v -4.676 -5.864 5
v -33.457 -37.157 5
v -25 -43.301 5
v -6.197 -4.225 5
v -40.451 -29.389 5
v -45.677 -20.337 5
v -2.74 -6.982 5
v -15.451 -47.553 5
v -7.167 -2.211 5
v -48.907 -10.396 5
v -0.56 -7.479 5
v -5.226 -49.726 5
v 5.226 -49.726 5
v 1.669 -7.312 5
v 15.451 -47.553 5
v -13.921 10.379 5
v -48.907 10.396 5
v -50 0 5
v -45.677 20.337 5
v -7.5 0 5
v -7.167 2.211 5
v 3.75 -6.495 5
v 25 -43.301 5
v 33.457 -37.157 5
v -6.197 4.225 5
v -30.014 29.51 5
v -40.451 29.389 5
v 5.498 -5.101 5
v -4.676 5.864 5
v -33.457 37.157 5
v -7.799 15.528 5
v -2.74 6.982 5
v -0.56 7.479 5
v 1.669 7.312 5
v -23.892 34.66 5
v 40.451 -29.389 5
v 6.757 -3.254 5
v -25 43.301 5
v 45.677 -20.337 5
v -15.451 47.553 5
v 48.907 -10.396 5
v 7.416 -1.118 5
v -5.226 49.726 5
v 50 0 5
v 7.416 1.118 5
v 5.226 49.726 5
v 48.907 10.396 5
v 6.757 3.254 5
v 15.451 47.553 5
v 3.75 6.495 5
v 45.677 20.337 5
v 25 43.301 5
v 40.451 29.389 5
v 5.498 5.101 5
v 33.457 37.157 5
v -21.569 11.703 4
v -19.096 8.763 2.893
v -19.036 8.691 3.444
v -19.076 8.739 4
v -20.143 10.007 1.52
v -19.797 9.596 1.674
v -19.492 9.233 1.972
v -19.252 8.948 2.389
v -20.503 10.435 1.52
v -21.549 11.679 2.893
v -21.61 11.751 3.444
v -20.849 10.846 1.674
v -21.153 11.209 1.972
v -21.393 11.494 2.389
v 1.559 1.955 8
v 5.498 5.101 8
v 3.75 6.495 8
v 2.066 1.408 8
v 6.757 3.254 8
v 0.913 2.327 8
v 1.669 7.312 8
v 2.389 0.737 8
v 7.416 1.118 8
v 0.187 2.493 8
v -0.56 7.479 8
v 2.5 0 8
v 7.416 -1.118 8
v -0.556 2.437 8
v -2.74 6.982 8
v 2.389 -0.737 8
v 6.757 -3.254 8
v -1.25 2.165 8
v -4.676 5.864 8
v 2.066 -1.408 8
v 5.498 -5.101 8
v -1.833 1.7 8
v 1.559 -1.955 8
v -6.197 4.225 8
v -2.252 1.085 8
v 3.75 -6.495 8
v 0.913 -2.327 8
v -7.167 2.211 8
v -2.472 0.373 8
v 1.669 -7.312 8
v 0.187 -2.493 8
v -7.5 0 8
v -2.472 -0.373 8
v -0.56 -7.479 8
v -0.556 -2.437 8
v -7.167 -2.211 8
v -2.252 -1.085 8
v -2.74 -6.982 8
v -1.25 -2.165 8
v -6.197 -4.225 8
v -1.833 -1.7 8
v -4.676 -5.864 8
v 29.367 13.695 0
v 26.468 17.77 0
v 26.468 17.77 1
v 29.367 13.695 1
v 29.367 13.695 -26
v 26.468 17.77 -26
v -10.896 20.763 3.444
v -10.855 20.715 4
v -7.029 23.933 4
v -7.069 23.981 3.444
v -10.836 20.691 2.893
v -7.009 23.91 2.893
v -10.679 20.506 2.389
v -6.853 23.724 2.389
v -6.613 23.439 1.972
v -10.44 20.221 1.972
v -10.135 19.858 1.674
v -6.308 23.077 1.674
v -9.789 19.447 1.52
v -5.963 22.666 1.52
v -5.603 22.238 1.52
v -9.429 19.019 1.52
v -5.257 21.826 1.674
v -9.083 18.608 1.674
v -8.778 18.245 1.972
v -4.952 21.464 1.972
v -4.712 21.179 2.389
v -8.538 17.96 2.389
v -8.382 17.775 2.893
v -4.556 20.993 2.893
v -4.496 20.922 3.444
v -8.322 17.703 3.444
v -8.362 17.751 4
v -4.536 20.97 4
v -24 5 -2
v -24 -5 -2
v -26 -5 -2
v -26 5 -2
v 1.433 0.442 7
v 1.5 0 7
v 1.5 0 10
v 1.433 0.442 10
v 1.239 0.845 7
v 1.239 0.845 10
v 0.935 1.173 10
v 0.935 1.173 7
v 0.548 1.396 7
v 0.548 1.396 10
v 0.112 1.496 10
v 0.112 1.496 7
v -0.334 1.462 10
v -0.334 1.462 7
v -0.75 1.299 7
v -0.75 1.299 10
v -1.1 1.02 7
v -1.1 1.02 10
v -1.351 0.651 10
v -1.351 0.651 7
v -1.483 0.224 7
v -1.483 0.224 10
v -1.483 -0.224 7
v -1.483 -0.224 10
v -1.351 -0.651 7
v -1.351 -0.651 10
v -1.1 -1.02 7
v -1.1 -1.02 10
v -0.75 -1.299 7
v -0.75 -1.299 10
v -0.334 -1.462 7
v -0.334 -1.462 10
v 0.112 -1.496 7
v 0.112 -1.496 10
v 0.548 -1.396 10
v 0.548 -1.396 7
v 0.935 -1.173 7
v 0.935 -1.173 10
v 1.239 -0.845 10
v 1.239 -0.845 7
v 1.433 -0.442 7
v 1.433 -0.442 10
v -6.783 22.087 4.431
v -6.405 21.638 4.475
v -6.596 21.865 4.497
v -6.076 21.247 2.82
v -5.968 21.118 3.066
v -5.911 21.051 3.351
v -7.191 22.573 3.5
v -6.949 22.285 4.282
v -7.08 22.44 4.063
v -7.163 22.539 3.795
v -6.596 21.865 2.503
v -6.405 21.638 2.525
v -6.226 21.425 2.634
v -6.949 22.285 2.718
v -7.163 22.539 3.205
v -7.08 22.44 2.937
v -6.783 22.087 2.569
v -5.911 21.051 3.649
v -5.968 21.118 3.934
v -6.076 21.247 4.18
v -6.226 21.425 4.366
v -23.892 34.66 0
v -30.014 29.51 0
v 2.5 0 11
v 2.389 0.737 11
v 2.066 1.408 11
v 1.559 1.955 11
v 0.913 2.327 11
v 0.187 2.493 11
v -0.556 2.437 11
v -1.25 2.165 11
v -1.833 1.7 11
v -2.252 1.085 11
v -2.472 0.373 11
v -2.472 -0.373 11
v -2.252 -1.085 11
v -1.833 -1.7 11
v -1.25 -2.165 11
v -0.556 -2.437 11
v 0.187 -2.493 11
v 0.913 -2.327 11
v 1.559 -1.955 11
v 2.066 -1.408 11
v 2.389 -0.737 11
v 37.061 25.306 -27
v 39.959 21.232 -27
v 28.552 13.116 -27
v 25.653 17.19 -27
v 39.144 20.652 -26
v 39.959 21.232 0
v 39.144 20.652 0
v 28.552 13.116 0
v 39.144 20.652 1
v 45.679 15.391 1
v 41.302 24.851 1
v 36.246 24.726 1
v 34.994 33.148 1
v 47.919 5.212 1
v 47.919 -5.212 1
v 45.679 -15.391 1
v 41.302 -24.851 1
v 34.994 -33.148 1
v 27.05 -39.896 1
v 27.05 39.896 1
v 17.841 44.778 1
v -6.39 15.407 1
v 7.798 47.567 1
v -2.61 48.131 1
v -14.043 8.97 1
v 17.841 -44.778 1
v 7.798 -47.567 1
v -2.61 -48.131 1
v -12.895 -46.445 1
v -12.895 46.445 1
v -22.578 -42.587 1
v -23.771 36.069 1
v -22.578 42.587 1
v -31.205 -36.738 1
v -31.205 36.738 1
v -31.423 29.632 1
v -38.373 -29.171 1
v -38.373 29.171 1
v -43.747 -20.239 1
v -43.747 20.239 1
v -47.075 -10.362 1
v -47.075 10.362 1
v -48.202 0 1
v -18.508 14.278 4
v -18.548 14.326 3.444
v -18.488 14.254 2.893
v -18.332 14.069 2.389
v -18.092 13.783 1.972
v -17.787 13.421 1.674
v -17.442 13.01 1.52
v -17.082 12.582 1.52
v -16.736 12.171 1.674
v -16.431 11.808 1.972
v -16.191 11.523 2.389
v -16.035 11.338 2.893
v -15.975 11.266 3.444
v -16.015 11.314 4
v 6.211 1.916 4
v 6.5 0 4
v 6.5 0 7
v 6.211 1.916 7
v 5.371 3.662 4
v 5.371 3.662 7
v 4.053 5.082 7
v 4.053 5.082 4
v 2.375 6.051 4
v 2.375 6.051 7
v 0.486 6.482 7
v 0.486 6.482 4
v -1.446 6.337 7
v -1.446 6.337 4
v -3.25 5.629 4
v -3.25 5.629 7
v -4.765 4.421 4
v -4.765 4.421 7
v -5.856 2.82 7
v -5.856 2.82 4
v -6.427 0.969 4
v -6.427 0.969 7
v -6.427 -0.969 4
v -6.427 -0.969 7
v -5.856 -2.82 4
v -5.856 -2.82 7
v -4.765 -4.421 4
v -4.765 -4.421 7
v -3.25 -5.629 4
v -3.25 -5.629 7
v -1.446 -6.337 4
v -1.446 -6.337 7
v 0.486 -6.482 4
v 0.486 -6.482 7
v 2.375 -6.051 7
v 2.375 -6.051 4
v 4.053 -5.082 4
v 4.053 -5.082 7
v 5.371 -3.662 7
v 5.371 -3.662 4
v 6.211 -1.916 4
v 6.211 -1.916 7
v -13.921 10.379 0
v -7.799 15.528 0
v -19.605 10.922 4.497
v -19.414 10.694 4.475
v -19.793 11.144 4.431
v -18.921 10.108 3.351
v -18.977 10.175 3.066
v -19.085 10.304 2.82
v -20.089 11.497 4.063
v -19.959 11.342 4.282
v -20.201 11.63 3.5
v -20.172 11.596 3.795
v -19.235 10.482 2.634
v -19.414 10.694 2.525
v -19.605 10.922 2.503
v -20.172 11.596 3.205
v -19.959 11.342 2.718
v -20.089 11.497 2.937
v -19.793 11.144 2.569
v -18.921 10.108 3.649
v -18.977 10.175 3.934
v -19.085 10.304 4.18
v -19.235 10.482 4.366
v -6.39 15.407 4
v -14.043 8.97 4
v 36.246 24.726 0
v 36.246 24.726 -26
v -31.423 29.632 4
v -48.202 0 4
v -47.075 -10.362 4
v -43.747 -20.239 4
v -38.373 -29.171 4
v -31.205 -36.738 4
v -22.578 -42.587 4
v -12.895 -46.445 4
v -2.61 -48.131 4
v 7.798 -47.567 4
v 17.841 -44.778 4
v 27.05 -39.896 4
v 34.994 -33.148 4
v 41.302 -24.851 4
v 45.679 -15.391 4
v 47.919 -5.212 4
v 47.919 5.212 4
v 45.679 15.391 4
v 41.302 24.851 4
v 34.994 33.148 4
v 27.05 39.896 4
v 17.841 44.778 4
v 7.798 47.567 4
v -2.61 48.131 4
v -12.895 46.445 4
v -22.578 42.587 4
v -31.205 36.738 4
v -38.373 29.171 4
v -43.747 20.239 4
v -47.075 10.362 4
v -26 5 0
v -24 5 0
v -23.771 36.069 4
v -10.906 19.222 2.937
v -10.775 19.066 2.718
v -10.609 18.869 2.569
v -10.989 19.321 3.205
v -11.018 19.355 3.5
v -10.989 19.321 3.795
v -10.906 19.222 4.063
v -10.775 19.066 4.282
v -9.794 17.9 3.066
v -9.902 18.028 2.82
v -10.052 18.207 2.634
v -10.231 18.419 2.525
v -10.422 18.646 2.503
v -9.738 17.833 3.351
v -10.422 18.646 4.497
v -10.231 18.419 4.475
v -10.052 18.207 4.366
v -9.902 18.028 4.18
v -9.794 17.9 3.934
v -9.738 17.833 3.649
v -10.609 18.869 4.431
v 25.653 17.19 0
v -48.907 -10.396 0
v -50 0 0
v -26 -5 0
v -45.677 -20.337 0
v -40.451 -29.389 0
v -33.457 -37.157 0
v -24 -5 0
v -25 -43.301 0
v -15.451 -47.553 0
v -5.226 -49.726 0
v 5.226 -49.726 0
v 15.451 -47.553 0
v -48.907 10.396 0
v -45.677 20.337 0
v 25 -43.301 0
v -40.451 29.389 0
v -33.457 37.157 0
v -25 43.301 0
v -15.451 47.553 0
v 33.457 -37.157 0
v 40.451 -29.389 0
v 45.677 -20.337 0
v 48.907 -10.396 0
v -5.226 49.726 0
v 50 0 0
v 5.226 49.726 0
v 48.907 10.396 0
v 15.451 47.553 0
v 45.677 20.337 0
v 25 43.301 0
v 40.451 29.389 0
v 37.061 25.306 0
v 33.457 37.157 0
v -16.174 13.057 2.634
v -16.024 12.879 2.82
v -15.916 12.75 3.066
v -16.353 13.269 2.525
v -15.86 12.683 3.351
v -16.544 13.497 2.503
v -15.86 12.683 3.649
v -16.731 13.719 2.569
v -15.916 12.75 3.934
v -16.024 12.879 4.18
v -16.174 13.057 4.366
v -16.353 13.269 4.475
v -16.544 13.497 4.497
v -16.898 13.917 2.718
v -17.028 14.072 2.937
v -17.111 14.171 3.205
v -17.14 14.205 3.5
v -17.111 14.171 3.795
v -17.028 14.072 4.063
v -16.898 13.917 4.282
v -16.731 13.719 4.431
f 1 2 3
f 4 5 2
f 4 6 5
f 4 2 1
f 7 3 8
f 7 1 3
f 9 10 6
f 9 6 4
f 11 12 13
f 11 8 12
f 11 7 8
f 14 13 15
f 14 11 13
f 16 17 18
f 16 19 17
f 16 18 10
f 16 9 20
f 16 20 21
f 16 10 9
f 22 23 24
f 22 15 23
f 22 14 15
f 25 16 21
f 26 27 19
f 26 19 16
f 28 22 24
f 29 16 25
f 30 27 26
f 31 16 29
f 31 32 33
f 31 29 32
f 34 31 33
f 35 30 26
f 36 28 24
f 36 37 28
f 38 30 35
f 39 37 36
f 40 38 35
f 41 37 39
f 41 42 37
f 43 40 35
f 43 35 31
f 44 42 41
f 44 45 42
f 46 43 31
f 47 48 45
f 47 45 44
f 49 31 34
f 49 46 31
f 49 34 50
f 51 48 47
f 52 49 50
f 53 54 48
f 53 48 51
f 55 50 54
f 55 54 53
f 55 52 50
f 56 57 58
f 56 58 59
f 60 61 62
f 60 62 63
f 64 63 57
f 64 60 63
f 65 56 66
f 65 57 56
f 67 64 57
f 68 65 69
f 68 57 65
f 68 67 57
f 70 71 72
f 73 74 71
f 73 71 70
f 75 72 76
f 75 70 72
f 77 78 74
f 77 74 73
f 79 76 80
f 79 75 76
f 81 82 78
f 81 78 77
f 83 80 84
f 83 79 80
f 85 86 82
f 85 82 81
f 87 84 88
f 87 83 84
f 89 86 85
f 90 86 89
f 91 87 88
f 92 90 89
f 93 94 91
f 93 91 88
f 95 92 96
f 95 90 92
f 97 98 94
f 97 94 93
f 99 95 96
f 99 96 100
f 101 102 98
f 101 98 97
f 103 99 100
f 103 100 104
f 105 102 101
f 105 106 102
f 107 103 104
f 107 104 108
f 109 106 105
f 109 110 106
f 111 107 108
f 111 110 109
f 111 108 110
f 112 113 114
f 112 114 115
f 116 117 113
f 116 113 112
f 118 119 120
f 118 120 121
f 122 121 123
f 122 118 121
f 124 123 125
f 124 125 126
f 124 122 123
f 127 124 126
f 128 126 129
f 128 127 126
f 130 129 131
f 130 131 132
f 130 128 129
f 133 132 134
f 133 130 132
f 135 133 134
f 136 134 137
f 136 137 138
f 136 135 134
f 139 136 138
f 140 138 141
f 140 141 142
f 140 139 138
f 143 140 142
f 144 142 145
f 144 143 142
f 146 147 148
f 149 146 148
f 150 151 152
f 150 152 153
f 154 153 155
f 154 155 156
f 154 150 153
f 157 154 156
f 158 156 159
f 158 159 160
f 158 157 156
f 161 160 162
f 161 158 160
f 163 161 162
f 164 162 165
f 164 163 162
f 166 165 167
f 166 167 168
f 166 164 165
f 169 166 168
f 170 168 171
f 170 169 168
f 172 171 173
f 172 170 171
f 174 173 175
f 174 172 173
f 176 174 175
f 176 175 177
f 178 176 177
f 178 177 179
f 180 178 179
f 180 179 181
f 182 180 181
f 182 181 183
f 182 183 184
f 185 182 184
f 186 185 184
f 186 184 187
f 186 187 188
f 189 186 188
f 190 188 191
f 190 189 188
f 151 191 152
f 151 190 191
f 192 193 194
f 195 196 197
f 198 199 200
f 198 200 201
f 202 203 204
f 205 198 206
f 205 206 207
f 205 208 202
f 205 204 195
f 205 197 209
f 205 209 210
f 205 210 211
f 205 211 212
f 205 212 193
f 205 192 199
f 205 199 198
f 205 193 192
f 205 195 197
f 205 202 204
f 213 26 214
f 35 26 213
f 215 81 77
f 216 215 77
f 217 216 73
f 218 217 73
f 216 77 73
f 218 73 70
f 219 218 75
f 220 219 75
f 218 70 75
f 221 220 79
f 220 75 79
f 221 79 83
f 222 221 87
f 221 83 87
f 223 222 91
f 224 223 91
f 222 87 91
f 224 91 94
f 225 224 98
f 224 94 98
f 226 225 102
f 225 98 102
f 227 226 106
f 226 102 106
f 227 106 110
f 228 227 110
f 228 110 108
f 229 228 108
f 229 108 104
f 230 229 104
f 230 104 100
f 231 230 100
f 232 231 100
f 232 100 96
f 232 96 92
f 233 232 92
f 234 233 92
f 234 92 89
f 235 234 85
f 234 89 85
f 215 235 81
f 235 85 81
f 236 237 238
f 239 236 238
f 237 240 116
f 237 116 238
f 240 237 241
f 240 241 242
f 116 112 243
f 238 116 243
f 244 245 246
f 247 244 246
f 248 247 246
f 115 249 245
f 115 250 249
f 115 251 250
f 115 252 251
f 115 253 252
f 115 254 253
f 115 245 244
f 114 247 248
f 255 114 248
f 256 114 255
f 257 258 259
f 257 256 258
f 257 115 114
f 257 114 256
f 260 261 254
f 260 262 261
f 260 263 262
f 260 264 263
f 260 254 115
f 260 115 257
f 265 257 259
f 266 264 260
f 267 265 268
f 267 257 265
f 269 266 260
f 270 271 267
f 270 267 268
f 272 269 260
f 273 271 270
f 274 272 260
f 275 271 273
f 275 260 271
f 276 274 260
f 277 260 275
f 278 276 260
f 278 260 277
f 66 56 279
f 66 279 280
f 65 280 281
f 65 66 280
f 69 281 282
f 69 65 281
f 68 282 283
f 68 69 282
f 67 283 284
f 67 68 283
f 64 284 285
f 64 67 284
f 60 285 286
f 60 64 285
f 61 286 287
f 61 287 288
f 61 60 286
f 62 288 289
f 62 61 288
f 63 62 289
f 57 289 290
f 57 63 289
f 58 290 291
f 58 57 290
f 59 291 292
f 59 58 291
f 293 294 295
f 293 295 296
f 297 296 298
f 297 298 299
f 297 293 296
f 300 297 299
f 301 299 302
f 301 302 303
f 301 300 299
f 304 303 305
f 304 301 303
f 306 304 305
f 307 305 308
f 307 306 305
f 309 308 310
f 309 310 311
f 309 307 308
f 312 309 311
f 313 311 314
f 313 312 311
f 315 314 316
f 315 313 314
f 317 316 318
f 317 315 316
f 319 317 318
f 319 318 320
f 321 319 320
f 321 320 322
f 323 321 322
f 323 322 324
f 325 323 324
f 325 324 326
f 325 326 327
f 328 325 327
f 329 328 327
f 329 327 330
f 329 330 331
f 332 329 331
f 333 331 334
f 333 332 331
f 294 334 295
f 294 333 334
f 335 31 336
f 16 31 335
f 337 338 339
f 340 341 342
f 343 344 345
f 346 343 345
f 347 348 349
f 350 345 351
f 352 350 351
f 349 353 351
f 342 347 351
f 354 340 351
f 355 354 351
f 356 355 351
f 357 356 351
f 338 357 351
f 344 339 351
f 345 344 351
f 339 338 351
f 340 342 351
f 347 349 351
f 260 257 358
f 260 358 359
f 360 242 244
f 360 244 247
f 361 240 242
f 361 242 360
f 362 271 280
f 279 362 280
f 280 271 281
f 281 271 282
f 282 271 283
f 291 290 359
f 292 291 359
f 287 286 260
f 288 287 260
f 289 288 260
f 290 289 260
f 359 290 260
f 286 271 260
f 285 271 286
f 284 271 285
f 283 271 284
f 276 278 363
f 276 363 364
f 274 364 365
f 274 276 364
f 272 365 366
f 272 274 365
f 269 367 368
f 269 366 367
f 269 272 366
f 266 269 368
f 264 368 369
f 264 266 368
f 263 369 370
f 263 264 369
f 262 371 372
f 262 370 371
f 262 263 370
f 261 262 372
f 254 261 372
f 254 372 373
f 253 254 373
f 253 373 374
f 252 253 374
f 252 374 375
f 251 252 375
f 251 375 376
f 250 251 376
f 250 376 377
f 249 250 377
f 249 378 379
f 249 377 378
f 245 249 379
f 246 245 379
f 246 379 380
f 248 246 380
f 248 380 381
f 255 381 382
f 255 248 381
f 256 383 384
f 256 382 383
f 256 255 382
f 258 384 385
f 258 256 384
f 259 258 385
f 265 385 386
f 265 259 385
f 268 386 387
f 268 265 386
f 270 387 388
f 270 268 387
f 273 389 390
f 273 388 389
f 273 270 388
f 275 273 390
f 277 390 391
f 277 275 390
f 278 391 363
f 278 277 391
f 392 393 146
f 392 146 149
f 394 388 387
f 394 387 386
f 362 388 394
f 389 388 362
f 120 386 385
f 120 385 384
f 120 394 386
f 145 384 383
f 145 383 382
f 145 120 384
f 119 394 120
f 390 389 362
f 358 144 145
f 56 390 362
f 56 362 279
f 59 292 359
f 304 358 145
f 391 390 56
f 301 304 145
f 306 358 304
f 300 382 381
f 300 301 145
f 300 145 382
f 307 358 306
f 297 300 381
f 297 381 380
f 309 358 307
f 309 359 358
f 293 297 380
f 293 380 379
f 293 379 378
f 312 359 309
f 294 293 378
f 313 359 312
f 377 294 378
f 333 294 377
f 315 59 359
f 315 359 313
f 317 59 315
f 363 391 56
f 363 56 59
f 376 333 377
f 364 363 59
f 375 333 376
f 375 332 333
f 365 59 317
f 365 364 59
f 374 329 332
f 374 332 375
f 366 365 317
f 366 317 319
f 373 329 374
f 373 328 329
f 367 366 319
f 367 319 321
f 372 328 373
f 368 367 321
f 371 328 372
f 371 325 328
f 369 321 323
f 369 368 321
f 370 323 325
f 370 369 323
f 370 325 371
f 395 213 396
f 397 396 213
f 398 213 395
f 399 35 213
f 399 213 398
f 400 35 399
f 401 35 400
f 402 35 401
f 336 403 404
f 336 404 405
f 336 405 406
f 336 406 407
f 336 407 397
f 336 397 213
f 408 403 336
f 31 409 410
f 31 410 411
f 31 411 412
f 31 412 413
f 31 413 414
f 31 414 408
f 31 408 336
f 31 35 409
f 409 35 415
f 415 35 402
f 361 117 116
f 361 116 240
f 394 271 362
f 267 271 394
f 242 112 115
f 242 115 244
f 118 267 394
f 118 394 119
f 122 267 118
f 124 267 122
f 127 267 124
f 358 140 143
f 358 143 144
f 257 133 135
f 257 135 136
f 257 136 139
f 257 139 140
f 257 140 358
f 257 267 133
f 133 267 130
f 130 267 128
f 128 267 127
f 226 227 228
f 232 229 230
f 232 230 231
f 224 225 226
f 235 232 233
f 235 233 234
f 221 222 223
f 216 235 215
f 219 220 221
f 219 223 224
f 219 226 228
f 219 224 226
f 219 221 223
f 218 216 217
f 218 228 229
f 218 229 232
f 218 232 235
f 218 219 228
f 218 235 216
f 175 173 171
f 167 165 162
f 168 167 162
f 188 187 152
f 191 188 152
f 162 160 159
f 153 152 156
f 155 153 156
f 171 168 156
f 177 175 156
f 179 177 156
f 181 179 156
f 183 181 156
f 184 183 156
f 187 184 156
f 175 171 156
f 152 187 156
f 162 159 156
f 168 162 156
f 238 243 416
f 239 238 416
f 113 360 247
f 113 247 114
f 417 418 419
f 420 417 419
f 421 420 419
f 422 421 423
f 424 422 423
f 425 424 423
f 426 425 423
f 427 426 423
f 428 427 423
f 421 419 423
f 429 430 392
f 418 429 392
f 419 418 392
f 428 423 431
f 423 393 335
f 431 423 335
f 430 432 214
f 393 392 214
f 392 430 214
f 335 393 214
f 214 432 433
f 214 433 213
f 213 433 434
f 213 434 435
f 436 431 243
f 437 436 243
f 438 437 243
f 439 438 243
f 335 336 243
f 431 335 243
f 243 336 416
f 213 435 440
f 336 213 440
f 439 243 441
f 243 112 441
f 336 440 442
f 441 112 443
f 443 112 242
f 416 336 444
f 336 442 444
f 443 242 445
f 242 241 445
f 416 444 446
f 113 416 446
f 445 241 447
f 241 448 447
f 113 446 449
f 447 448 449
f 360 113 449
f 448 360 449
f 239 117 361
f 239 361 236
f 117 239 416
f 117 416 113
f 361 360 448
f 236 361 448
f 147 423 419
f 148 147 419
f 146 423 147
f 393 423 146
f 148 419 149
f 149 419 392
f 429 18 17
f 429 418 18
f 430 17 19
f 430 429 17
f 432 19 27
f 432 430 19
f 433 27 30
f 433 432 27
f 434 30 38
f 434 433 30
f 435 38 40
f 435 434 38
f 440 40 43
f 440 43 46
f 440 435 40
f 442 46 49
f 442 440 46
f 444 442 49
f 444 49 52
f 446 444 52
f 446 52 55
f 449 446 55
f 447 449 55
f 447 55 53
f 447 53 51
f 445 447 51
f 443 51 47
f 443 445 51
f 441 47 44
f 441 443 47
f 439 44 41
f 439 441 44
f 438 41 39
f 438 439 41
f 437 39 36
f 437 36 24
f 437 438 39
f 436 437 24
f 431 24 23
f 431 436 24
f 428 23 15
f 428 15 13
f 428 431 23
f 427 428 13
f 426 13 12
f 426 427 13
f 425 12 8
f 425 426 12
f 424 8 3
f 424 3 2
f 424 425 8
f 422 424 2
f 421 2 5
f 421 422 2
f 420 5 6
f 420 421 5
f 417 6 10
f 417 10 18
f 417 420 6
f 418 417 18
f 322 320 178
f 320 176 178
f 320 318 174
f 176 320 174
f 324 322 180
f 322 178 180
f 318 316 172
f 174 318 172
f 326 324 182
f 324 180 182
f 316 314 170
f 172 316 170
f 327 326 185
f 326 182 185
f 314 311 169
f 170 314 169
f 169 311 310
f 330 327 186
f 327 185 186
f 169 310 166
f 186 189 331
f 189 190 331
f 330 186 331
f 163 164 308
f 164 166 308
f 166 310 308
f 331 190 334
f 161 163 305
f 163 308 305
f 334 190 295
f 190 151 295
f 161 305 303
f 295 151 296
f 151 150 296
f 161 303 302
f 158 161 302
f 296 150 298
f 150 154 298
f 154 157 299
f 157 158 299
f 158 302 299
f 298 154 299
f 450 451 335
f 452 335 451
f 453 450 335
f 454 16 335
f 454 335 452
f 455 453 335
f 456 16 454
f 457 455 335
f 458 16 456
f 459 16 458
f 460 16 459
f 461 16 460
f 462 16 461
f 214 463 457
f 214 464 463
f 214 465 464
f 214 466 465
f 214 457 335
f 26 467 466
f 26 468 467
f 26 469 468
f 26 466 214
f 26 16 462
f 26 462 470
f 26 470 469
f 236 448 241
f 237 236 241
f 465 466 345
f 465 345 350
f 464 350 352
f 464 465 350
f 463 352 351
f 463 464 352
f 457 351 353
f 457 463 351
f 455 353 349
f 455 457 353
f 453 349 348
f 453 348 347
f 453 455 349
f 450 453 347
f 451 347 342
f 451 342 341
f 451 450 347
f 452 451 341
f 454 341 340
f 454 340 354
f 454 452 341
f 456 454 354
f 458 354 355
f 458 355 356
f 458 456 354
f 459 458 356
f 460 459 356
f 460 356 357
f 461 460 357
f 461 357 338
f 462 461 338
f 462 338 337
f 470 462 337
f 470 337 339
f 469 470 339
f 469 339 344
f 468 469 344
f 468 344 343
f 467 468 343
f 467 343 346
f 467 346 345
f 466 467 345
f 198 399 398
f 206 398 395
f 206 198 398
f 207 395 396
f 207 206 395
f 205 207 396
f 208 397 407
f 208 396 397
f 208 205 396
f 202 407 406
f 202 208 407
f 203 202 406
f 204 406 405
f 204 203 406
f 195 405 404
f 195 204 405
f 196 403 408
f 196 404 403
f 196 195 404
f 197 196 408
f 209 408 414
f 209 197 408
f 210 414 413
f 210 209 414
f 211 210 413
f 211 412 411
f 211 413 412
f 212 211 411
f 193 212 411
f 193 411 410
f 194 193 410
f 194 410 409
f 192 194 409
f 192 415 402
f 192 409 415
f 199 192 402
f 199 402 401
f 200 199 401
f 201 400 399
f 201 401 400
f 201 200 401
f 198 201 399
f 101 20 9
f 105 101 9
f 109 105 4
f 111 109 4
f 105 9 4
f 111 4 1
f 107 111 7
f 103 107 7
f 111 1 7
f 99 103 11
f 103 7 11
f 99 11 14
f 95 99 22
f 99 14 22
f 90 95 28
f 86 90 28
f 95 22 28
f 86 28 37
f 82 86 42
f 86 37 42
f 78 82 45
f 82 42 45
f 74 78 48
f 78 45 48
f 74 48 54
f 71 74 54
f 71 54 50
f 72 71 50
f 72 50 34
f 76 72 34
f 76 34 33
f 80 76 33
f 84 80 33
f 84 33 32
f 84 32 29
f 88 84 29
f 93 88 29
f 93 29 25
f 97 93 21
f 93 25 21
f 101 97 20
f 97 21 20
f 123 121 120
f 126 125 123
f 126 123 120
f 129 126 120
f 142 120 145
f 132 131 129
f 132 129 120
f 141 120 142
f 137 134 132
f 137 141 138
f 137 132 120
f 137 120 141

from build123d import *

# Parameters (mm, degrees)
SKETCH1_W               = 100
SKETCH1_H               = 100
BOSS_EXTRUDE1_DEPTH     = 5
SKETCH2_R               = 7.5
BOSS_EXTRUDE2_DEPTH     = 3
SKETCH3_R               = 2.5
BOSS_EXTRUDE3_DEPTH     = 3
CUT_EXTRUDE1_DEPTH      = 71.964779997
CUT_EXTRUDE2_DEPTH      = 12
CUT_EXTRUDE2_DEPTH_BACK = 5
SKETCH11_R              = 1
BOSS_EXTRUDE5_DEPTH     = 27
SHELL1_START            = 5.027136377
SHELL1_DEPTH            = 5
SHELL1_START_2          = -8.972863623
SHELL1_2_DEPTH          = 4
SHELL1_START_3          = 10.027136377
SHELL1_3_DEPTH          = 34.623982156
SHELL1_START_4          = 43.654391787
SHELL1_4_DEPTH          = 0.996726746
SHELL1_START_5          = 30.292722796
SHELL1_5_DEPTH          = 0.404221296
SHELL1_START_6          = 1
SHELL1_6_DEPTH          = 3
SHELL1_START_7          = -26
SHELL1_7_DEPTH          = 27
SHELL1_START_8          = 4
SHELL1_8_OUTLINE_R      = 6.5
SHELL1_8_DEPTH          = 3
SHELL1_START_9          = 7
SHELL1_9_OUTLINE_R      = 1.5
SHELL1_9_DEPTH          = 3
SHELL1_10_DEPTH         = 3
SKETCH14_W              = 105.332153784
SKETCH14_H              = 107.039050792
SKETCH14_R              = 50
CUT_EXTRUDE3_DEPTH      = 76.690157881
BOSS_EXTRUDE6_START     = -5
SKETCH15_R              = 50
SKETCH15_R_2            = 48.20184761
BOSS_EXTRUDE6_DEPTH     = 5
SKETCH16_W              = 2
SKETCH16_H              = 10
BOSS_EXTRUDE7_DEPTH     = 2


with BuildPart() as part:
    # Sketch1 → Boss-Extrude1 (new body)
    with BuildSketch(Plane.XY):
        Rectangle(SKETCH1_W, SKETCH1_H)
    extrude(amount=BOSS_EXTRUDE1_DEPTH)

    # Sketch2 → Boss-Extrude2 (add)
    with BuildSketch(Plane.XY.offset(5)):
        with Locations(Location((0, 0, 0), (0, 0, 180))):
            Circle(SKETCH2_R)
    extrude(amount=BOSS_EXTRUDE2_DEPTH)

    # Sketch3 → Boss-Extrude3 (add)
    with BuildSketch(Plane.XY.offset(8)):
        Circle(SKETCH3_R)
    extrude(amount=BOSS_EXTRUDE3_DEPTH)

    # Sketch10 → Cut-Extrude1 (cut, through all)
    with BuildSketch(Plane.XY.offset(5)):
        Polygon((-7.799279723, 15.528201009), (-13.921426992, 10.378510454), (-30.014209976, 29.510220671), (-23.892062707, 34.659911226), align=None)
    extrude(amount=-CUT_EXTRUDE1_DEPTH, mode=Mode.SUBTRACT)

    # Sketch11 → Cut-Extrude2 (cut, two sides: drawn at the far end of the back side and taken through both)
    with BuildSketch(Plane(origin=(3.081840247, 2.592313271, 0), x_dir=(0, 0, 1), z_dir=(-0.765268408666043, -0.6437113193798463, 0)).offset(-CUT_EXTRUDE2_DEPTH_BACK)):
        with Locations(Location((3.5, 20.903726316, 0), (0, 0, 90))):
            Circle(SKETCH11_R)
    extrude(amount=CUT_EXTRUDE2_DEPTH + CUT_EXTRUDE2_DEPTH_BACK, mode=Mode.SUBTRACT)

    # Sketch13 → Boss-Extrude5 (add)
    with BuildSketch(Plane(origin=(0, 0, 0), x_dir=(-1, 0, 0), z_dir=(0, 0, -1))):
        Polygon((-25.653340805, 17.18977508), (-37.06059478, 25.306089315), (-39.959278435, 21.232070039), (-28.552024461, 13.115755803), align=None)
    extrude(amount=BOSS_EXTRUDE5_DEPTH)

    # Shell1: read off the stored shape, not the designer's step
    # Shell1 outline → Shell1 (cut)
    with BuildSketch(Plane(origin=(0, 0, 0), x_dir=(0.6437113193798459, -0.7652684086660432, 0), z_dir=(0.7652684086660431, 0.6437113193798462, 0)).offset(SHELL1_START)):
        with BuildLine():
            Line((-18.967234643, -4), (-15.903726316, -4))
            Line((-15.903726316, -4), (-15.903726316, -1))
            Line((-15.903726316, -1), (-42.903726316, -1))
            Line((-42.903726316, -1), (-42.903726316, -4))
            Line((-42.903726316, -4), (-22.840217989, -4))
            ThreePointArc((-22.840217989, -4), (-20.903726316, -1.5), (-18.967234643, -4))
        make_face()
    extrude(amount=SHELL1_DEPTH, mode=Mode.SUBTRACT)

    # Shell1 2 outline → Shell1 2 (cut)
    with BuildSketch(Plane(origin=(0, 0, 0), x_dir=(0.6437113193798459, -0.7652684086660432, 0), z_dir=(0.7652684086660431, 0.6437113193798462, 0)).offset(SHELL1_START_2)):
        with BuildLine():
            Line((-18.967234643, -4), (-15.903726316, -4))
            Line((-15.903726316, -4), (-15.903726316, -1))
            Line((-15.903726316, -1), (-42.903726316, -1))
            Line((-42.903726316, -1), (-42.903726316, -4))
            Line((-42.903726316, -4), (-22.840217989, -4))
            ThreePointArc((-22.840217989, -4), (-20.903726316, -1.5), (-18.967234643, -4))
        make_face()
    extrude(amount=SHELL1_2_DEPTH, mode=Mode.SUBTRACT)

    # Shell1 3 outline → Shell1 3 (cut)
    with BuildSketch(Plane(origin=(0, 0, 0), x_dir=(0.6437113193798459, -0.7652684086660432, 0), z_dir=(0.7652684086660431, 0.6437113193798462, 0)).offset(SHELL1_START_3)):
        with BuildLine():
            Line((-22.840217989, -4), (-18.967234643, -4))
            ThreePointArc((-18.967234643, -4), (-20.903726316, -1.5), (-22.840217989, -4))
        make_face()
    extrude(amount=SHELL1_3_DEPTH, mode=Mode.SUBTRACT)

    # Shell1 4 outline → Shell1 4 (cut)
    with BuildSketch(Plane(origin=(0, 0, 0), x_dir=(0.6437113193798459, -0.7652684086660432, 0), z_dir=(0.7652684086660431, 0.6437113193798462, 0)).offset(SHELL1_START_4)):
        with BuildLine():
            Line((-18.967234643, -4), (-15.903726316, -4))
            Line((-15.903726316, -4), (-15.903726316, -1))
            Line((-15.903726316, -1), (-42.903726316, -1))
            Line((-42.903726316, -1), (-42.903726316, -4))
            Line((-42.903726316, -4), (-22.840217989, -4))
            ThreePointArc((-22.840217989, -4), (-20.903726316, -1.5), (-18.967234643, -4))
        make_face()
    extrude(amount=SHELL1_4_DEPTH, mode=Mode.SUBTRACT)

    # Shell1 5 outline → Shell1 5 (cut)
    with BuildSketch(Plane(origin=(0, 0, 0), x_dir=(0.6437113193798459, -0.7652684086660432, 0), z_dir=(0.7652684086660431, 0.6437113193798462, 0)).offset(SHELL1_START_5)):
        with BuildLine():
            Line((-18.967234643, -4), (-15.903726316, -4))
            Line((-15.903726316, -4), (-15.903726316, -1))
            Line((-15.903726316, -1), (-42.903726316, -1))
            Line((-42.903726316, -1), (-42.903726316, -4))
            Line((-42.903726316, -4), (-22.840217989, -4))
            ThreePointArc((-22.840217989, -4), (-20.903726316, -1.5), (-18.967234643, -4))
        make_face()
    extrude(amount=SHELL1_5_DEPTH, mode=Mode.SUBTRACT)

    # Shell1 6 outline → Shell1 6 (cut)
    with BuildSketch(Plane.XY.offset(SHELL1_START_6)):
        Polygon((49, -49), (49, 49), (17.13028231, 49), (23.932681775, 40.913049752), (23.169918284, 40.271445464), (15.827828511, 49), (-1.10407087, 49), (13.253992906, 31.930589712), (12.944655118, 31.670387888), (-1.632279393, 49), (-49, 49), (-49, -49), align=None)
        Polygon((-2.563957951, 18.625200517), (-6.390299995, 15.40664392), (-14.042984081, 8.969530726), (-17.104057716, 6.394685448), (-19.035191674, 8.690490674), (-21.610036952, 11.751564309), (-34.484263339, 27.056932482), (-31.423189704, 29.63177776), (-23.770505618, 36.068890954), (-19.944163574, 39.287447551), align=None, mode=Mode.SUBTRACT)
    extrude(amount=SHELL1_6_DEPTH, mode=Mode.SUBTRACT)

    # Shell1 7 outline → Shell1 7 (cut)
    with BuildSketch(Plane.XY.offset(SHELL1_START_7)):
        Polygon((36.245790924, 24.726352584), (26.46814466, 17.769511811), (29.366828316, 13.695492535), (39.14447458, 20.652333308), align=None)
    extrude(amount=SHELL1_7_DEPTH, mode=Mode.SUBTRACT)

    # Shell1 8 outline → Shell1 8 (cut)
    with BuildSketch(Plane.XY.offset(SHELL1_START_8)):
        Circle(SHELL1_8_OUTLINE_R)
    extrude(amount=SHELL1_8_DEPTH, mode=Mode.SUBTRACT)

    # Shell1 9 outline → Shell1 9 (cut)
    with BuildSketch(Plane.XY.offset(SHELL1_START_9)):
        Circle(SHELL1_9_OUTLINE_R)
    extrude(amount=SHELL1_9_DEPTH, mode=Mode.SUBTRACT)

    # Shell1 10 outline → Shell1 10 (add)
    with BuildSketch(Plane.XY.offset(SHELL1_START_6)):
        Polygon((15.827828511, 49), (17.13028231, 49), (16.289124734, 50), (14.986670935, 50), align=None)
        Polygon((-1.632279393, 49), (-1.10407087, 49), (-1.945228446, 50), (-2.473436969, 50), align=None)
    extrude(amount=SHELL1_10_DEPTH)

    # Sketch14 → Cut-Extrude3 (cut, through all)
    with BuildSketch(Plane(origin=(0, 0, 0), x_dir=(-1, 0, 0), z_dir=(0, 0, -1))):
        Rectangle(SKETCH14_W, SKETCH14_H)
        Circle(SKETCH14_R, mode=Mode.SUBTRACT)
    extrude(amount=-CUT_EXTRUDE3_DEPTH, mode=Mode.SUBTRACT)

    # Sketch15 → Boss-Extrude6 (add)
    with BuildSketch(Plane.XY.offset(5).offset(BOSS_EXTRUDE6_START)):
        with Locations(Location((0, 0, 0), (0, 0, 180))):
            Circle(SKETCH15_R)
        with Locations(Location((0, 0, 0), (0, 0, 180))):
            Circle(SKETCH15_R_2, mode=Mode.SUBTRACT)
    extrude(amount=BOSS_EXTRUDE6_DEPTH)

    # Sketch16 → Boss-Extrude7 (add)
    with BuildSketch(Plane(origin=(0, 0, 0), x_dir=(-1, 0, 0), z_dir=(0, 0, -1))):
        with Locations((25, 0)):
            Rectangle(SKETCH16_W, SKETCH16_H)
    extrude(amount=BOSS_EXTRUDE7_DEPTH)


solid = part.part
